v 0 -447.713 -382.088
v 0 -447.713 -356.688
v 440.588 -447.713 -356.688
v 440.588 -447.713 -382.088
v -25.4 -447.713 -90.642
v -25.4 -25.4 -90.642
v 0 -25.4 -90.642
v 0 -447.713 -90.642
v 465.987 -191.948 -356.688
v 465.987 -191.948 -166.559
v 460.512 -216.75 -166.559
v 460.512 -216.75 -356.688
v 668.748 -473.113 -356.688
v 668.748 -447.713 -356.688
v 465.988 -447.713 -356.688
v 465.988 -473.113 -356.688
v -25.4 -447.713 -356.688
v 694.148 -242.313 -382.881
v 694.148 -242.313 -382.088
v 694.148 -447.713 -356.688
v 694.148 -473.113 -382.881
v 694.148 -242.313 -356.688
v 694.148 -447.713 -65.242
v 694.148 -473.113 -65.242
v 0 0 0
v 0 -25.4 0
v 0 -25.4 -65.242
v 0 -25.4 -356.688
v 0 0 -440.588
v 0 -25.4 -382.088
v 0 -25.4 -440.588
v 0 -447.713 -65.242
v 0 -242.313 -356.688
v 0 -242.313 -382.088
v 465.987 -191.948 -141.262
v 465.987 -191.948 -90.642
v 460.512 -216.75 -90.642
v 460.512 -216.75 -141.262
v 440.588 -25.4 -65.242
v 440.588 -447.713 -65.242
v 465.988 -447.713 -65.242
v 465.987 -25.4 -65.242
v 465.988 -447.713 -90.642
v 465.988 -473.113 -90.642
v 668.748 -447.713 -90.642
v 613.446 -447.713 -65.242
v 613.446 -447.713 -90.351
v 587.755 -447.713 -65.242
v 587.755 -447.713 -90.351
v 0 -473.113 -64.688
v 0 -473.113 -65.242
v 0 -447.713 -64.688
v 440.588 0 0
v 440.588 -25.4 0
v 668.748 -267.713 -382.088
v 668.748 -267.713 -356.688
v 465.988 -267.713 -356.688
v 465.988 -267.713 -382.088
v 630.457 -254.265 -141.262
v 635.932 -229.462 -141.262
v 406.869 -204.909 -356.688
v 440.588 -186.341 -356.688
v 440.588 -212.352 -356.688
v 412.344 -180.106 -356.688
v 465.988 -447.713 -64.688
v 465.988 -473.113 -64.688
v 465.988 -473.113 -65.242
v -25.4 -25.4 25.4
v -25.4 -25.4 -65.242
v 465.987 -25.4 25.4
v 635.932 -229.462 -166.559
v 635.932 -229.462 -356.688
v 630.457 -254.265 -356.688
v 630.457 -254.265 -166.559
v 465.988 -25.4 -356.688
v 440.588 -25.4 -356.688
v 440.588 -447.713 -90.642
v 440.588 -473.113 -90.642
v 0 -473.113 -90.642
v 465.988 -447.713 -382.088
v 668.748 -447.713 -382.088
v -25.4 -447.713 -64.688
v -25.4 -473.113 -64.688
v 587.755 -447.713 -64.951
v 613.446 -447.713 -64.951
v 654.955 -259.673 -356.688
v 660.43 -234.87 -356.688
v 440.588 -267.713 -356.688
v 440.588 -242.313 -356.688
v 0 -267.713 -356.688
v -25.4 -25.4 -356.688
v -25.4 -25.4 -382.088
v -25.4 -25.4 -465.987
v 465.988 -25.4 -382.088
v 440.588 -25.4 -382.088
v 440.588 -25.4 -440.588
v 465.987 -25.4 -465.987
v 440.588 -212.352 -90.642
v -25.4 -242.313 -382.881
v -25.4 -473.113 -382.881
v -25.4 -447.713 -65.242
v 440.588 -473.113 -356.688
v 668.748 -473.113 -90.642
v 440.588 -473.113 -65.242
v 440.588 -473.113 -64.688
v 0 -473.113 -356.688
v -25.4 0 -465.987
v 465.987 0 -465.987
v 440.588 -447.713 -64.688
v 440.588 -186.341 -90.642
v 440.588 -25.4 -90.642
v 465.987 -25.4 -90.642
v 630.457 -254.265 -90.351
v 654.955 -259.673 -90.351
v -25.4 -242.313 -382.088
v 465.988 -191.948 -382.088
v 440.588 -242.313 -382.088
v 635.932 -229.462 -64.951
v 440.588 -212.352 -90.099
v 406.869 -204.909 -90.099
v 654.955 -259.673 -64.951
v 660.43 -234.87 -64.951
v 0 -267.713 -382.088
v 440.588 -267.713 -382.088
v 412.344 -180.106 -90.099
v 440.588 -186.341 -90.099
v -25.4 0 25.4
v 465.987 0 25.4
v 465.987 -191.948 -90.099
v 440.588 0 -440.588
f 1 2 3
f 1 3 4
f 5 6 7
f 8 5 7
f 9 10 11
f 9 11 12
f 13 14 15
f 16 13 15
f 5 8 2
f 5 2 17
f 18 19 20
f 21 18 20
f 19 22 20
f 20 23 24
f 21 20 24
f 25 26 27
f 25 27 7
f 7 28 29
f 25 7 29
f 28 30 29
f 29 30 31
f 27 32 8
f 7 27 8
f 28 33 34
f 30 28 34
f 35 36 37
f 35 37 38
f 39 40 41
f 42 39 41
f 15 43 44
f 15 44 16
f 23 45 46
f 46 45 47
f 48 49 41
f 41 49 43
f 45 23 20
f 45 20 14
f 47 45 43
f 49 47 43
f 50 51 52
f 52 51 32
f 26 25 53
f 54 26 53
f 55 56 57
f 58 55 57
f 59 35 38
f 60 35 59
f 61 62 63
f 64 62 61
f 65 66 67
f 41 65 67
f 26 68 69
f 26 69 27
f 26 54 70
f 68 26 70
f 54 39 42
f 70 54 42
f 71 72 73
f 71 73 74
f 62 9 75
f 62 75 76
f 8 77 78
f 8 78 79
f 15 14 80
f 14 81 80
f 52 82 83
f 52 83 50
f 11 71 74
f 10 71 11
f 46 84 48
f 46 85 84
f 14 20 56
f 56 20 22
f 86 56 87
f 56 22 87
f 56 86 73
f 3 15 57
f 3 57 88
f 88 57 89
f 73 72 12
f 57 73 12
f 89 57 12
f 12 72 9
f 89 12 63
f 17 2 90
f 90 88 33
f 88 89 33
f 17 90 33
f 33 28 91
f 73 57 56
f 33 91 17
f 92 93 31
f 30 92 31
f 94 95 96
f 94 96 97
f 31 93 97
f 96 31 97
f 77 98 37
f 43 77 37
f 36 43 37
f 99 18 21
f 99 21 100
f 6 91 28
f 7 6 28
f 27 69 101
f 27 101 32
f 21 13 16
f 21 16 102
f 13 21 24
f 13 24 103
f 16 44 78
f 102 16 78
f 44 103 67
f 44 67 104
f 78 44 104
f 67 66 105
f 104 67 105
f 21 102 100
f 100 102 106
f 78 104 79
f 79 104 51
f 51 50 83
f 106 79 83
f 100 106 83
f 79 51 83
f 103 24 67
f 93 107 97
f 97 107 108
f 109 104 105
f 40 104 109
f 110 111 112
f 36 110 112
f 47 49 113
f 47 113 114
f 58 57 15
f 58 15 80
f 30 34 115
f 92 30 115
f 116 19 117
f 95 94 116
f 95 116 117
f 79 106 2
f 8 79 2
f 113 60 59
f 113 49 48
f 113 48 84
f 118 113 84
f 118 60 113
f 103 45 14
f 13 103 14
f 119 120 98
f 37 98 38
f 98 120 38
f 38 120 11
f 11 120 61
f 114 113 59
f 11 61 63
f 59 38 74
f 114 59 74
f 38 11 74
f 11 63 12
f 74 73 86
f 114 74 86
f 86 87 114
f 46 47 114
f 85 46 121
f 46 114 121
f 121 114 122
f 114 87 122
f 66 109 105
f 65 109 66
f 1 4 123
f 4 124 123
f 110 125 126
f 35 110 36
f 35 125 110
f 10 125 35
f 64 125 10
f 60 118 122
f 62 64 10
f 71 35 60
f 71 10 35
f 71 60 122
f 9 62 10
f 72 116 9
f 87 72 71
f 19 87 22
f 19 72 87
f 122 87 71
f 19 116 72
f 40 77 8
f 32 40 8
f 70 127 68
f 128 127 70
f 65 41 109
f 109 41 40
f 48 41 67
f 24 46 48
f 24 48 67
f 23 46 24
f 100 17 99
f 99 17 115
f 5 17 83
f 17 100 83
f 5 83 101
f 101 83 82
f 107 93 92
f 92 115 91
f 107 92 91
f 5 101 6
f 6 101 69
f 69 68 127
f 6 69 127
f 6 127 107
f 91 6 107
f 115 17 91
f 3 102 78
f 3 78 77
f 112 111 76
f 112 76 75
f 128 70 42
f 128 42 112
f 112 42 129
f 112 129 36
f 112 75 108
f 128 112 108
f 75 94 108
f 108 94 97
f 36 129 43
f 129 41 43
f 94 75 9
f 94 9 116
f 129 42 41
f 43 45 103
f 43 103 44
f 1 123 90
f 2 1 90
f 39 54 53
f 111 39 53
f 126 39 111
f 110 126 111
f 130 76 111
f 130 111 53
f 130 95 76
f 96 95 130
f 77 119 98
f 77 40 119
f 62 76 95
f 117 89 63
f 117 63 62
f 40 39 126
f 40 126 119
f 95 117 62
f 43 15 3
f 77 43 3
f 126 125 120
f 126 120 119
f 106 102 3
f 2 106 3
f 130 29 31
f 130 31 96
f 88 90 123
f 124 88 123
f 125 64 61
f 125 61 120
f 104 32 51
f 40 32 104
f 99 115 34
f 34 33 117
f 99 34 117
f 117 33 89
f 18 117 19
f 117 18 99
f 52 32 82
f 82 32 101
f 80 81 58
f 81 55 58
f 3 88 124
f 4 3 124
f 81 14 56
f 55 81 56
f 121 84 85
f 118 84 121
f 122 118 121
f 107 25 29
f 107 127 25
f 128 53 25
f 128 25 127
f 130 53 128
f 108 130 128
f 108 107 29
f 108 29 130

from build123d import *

# Parameters (mm, degrees)
CROQUIS1_W               = 491.3875
CROQUIS1_H               = 491.3875
CROQUIS1_W_2             = 440.5875
CROQUIS1_H_2             = 440.5875
SALIENTE_EXTRUIR1_DEPTH  = 25.4
CROQUIS2_W               = 25.4
CROQUIS2_H               = 25.4
SALIENTE_EXTRUIR2_DEPTH  = 422.312858808
CROQUIS3_W               = 25.4
CROQUIS3_H               = 25.4
SALIENTE_EXTRUIR3_DEPTH  = 25.4
SALIENTE_EXTRUIR4_REACH  = 813.249
CROQUIS4_W               = 25.4
CROQUIS4_H               = 25.4
CROQUIS5_W               = 25.4
CROQUIS5_H               = 25.4
SALIENTE_EXTRUIR5_DEPTH  = 292
SALIENTE_EXTRUIR7_REACH  = 813.249
CROQUIS7_W               = 25.4
CROQUIS7_H               = 25.4
SALIENTE_EXTRUIR9_DEPTH  = 25.4
SALIENTE_EXTRUIR10_DEPTH = 25.4
SALIENTE_EXTRUIR11_REACH = 950.384
CROQUIS11_W              = 25.4
CROQUIS11_H              = 25.4
SALIENTE_EXTRUIR12_DEPTH = 25.4
SALIENTE_EXTRUIR13_REACH = 932.183
CROQUIS13_W              = 25.087212933
CROQUIS13_H              = 25.4
SALIENTE_EXTRUIR8_DEPTH  = 0.79375


with BuildPart() as part:
    # Croquis1 → Saliente-Extruir1 (new body)
    with BuildSketch(Plane(origin=(0, 0, 0), x_dir=(1, 0, 0), z_dir=(0, 1, 0))):
        with Locations((220.29375, 220.29375)):
            Rectangle(CROQUIS1_W, CROQUIS1_H)
        with Locations((220.29375, 220.29375)):
            Rectangle(CROQUIS1_W_2, CROQUIS1_H_2, mode=Mode.SUBTRACT)
    extrude(amount=-SALIENTE_EXTRUIR1_DEPTH)

    # Croquis2 → Saliente-Extruir2 (add)
    with BuildSketch(Plane.XZ.offset(25.4)):
        with Locations((453.2875, -369.3875)):
            Rectangle(CROQUIS2_W, CROQUIS2_H)
        with Locations((-12.7, -369.3875)):
            Rectangle(CROQUIS2_W, CROQUIS2_H)
    extrude(amount=SALIENTE_EXTRUIR2_DEPTH)

    # Croquis3 → Saliente-Extruir3 (add)
    with BuildSketch(Plane.XZ.offset(447.712858808)):
        with Locations((-12.7, -369.3875)):
            Rectangle(CROQUIS3_W, CROQUIS3_H)
        with Locations((453.2875, -369.3875)):
            Rectangle(CROQUIS3_W, CROQUIS3_H)
    extrude(amount=SALIENTE_EXTRUIR3_DEPTH)

    # Croquis4 → Saliente-Extruir4 (add, up to next)
    with BuildSketch(Plane(origin=(0, 0, 0), x_dir=(0, 0, -1), z_dir=(1, 0, 0)), mode=Mode.PRIVATE) as saliente_extruir4_sk1:
        with Locations((369.3875, -460.412858808)):
            Rectangle(CROQUIS4_W, CROQUIS4_H)
    saliente_extruir4_tool1 = extrude(saliente_extruir4_sk1.sketch, amount=SALIENTE_EXTRUIR4_REACH, mode=Mode.PRIVATE) - part.part
    add(saliente_extruir4_tool1.solids().sort_by_distance((0, -460.412859, -369.3875))[0])

    # Croquis5 → Saliente-Extruir5 (add)
    with BuildSketch(Plane.XY.offset(-356.6875)):
        with Locations((-12.7, -460.412858808)):
            Rectangle(CROQUIS5_W, CROQUIS5_H)
        with Locations((453.2875, -460.412858808)):
            Rectangle(CROQUIS5_W, CROQUIS5_H)
    extrude(amount=SALIENTE_EXTRUIR5_DEPTH)

    # Croquis7 → Saliente-Extruir7 (add, up to next)
    with BuildSketch(Plane(origin=(0, 0, 0), x_dir=(0, 0, -1), z_dir=(1, 0, 0)), mode=Mode.PRIVATE) as saliente_extruir7_sk1:
        with Locations((369.3875, -255.012858808)):
            Rectangle(CROQUIS7_W, CROQUIS7_H)
    saliente_extruir7_tool1 = extrude(saliente_extruir7_sk1.sketch, amount=SALIENTE_EXTRUIR7_REACH, mode=Mode.PRIVATE) - part.part
    add(saliente_extruir7_tool1.solids().sort_by_distance((0, -255.012859, -369.3875))[0])

    # Croquis9 → Saliente-Extruir9 (add)
    with BuildSketch(Plane(origin=(0, -447.712858808, 0), x_dir=(1, 0, 0), z_dir=(0, 1, 0))):
        Polygon((465.9875, 382.0875), (694.147848124, 382.0875), (694.147848124, 65.242422269), (465.9875, 65.242422269), (0, 65.242422269), (0, 90.642422269), (465.9875, 90.642422269), (668.747848124, 90.642422269), (668.747848124, 356.6875), (465.9875, 356.6875), align=None)
    extrude(amount=-SALIENTE_EXTRUIR9_DEPTH)

    # Croquis10 → Saliente-Extruir10 (add)
    with BuildSketch(Plane.XY.offset(-356.6875)):
        Polygon((668.747848124, -447.712858808), (668.747848124, -267.712858808), (465.9875, -267.712858808), (465.9875, -191.947517804), (694.147848124, -242.312858808), (694.147848124, -447.712858808), align=None)
    extrude(amount=-SALIENTE_EXTRUIR10_DEPTH)

    # Croquis11 → Saliente-Extruir11 (add, up to next)
    with BuildSketch(Plane(origin=(0, -447.712858808, 0), x_dir=(1, 0, 0), z_dir=(0, 1, 0)), mode=Mode.PRIVATE) as saliente_extruir11_sk1:
        with Locations((-12.7, 77.942422269)):
            Rectangle(CROQUIS11_W, CROQUIS11_H)
    saliente_extruir11_tool1 = extrude(saliente_extruir11_sk1.sketch, amount=SALIENTE_EXTRUIR11_REACH, mode=Mode.PRIVATE) - part.part
    # Croquis11 → Saliente-Extruir11 (add, up to next)
    with BuildSketch(Plane(origin=(0, -447.712858808, 0), x_dir=(1, 0, 0), z_dir=(0, 1, 0)), mode=Mode.PRIVATE) as saliente_extruir11_sk2:
        with Locations((453.2875, 77.942422269)):
            Rectangle(CROQUIS11_W, CROQUIS11_H)
    saliente_extruir11_tool2 = extrude(saliente_extruir11_sk2.sketch, amount=SALIENTE_EXTRUIR11_REACH, mode=Mode.PRIVATE) - part.part
    add(saliente_extruir11_tool1.solids().sort_by_distance((-12.7, -447.712859, -77.942422))[0])
    add(saliente_extruir11_tool2.solids().sort_by_distance((453.2875, -447.712859, -77.942422))[0])

    # Croquis12 → Saliente-Extruir12 (add)
    with BuildSketch(Plane(origin=(-18.750939814, -84.943750412, 0), x_dir=(0.9764914853588178, -0.21555597653911102, 0), z_dir=(0.21555597653911102, 0.9764914853588178, 0))):
        Polygon((670.444567301, 356.6875), (670.444567301, 166.558874098), (496.408260678, 166.558874098), (496.408260678, 356.6875), (441.473637421, 356.6875), (441.473637421, 90.098891747), (496.408260678, 90.098891747), (496.408260678, 141.262403959), (670.444567301, 141.262403959), (670.444567301, 64.950724727), (695.531780234, 64.950724727), (695.531780234, 356.6875), align=None)
    extrude(amount=-SALIENTE_EXTRUIR12_DEPTH)

    # Saliente-Extruir13: up to this plane
    saliente_extruir13_end = Plane(origin=(0, -447.712858808, -64.6875), z_dir=(0, -1, 0))
    # Croquis13 → Saliente-Extruir13 (add, up to the surface)
    with BuildSketch(Plane(origin=(-24.226061618, -109.74663414, 0), x_dir=(0.9764914853588177, -0.21555597653911182, 0), z_dir=(-0.21555597653911182, -0.9764914853588177, 0)), mode=Mode.PRIVATE) as saliente_extruir13_sk1:
        with Locations((682.988173768, -77.650724727)):
            Rectangle(CROQUIS13_W, CROQUIS13_H)
    saliente_extruir13_tool1 = split(extrude(saliente_extruir13_sk1.sketch, amount=SALIENTE_EXTRUIR13_REACH, mode=Mode.PRIVATE), bisect_by=saliente_extruir13_end, keep=Keep.BOTH, mode=Mode.PRIVATE)
    add(saliente_extruir13_tool1.solids().sort_by_distance((642.706075, -256.968817, -77.650725))[0])

    # Croquis8 → Saliente-Extruir8 (add)
    with BuildSketch(Plane(origin=(0, 0, -382.0875), x_dir=(-1, 0, 0), z_dir=(0, 0, -1))):
        Polygon((-465.9875, -473.112858808), (25.4, -473.112858808), (25.4, -242.312858808), (-465.9875, -242.312858808), (-694.147848124, -242.312858808), (-694.147848124, -473.112858808), align=None)
    extrude(amount=SALIENTE_EXTRUIR8_DEPTH)


solid = part.part
